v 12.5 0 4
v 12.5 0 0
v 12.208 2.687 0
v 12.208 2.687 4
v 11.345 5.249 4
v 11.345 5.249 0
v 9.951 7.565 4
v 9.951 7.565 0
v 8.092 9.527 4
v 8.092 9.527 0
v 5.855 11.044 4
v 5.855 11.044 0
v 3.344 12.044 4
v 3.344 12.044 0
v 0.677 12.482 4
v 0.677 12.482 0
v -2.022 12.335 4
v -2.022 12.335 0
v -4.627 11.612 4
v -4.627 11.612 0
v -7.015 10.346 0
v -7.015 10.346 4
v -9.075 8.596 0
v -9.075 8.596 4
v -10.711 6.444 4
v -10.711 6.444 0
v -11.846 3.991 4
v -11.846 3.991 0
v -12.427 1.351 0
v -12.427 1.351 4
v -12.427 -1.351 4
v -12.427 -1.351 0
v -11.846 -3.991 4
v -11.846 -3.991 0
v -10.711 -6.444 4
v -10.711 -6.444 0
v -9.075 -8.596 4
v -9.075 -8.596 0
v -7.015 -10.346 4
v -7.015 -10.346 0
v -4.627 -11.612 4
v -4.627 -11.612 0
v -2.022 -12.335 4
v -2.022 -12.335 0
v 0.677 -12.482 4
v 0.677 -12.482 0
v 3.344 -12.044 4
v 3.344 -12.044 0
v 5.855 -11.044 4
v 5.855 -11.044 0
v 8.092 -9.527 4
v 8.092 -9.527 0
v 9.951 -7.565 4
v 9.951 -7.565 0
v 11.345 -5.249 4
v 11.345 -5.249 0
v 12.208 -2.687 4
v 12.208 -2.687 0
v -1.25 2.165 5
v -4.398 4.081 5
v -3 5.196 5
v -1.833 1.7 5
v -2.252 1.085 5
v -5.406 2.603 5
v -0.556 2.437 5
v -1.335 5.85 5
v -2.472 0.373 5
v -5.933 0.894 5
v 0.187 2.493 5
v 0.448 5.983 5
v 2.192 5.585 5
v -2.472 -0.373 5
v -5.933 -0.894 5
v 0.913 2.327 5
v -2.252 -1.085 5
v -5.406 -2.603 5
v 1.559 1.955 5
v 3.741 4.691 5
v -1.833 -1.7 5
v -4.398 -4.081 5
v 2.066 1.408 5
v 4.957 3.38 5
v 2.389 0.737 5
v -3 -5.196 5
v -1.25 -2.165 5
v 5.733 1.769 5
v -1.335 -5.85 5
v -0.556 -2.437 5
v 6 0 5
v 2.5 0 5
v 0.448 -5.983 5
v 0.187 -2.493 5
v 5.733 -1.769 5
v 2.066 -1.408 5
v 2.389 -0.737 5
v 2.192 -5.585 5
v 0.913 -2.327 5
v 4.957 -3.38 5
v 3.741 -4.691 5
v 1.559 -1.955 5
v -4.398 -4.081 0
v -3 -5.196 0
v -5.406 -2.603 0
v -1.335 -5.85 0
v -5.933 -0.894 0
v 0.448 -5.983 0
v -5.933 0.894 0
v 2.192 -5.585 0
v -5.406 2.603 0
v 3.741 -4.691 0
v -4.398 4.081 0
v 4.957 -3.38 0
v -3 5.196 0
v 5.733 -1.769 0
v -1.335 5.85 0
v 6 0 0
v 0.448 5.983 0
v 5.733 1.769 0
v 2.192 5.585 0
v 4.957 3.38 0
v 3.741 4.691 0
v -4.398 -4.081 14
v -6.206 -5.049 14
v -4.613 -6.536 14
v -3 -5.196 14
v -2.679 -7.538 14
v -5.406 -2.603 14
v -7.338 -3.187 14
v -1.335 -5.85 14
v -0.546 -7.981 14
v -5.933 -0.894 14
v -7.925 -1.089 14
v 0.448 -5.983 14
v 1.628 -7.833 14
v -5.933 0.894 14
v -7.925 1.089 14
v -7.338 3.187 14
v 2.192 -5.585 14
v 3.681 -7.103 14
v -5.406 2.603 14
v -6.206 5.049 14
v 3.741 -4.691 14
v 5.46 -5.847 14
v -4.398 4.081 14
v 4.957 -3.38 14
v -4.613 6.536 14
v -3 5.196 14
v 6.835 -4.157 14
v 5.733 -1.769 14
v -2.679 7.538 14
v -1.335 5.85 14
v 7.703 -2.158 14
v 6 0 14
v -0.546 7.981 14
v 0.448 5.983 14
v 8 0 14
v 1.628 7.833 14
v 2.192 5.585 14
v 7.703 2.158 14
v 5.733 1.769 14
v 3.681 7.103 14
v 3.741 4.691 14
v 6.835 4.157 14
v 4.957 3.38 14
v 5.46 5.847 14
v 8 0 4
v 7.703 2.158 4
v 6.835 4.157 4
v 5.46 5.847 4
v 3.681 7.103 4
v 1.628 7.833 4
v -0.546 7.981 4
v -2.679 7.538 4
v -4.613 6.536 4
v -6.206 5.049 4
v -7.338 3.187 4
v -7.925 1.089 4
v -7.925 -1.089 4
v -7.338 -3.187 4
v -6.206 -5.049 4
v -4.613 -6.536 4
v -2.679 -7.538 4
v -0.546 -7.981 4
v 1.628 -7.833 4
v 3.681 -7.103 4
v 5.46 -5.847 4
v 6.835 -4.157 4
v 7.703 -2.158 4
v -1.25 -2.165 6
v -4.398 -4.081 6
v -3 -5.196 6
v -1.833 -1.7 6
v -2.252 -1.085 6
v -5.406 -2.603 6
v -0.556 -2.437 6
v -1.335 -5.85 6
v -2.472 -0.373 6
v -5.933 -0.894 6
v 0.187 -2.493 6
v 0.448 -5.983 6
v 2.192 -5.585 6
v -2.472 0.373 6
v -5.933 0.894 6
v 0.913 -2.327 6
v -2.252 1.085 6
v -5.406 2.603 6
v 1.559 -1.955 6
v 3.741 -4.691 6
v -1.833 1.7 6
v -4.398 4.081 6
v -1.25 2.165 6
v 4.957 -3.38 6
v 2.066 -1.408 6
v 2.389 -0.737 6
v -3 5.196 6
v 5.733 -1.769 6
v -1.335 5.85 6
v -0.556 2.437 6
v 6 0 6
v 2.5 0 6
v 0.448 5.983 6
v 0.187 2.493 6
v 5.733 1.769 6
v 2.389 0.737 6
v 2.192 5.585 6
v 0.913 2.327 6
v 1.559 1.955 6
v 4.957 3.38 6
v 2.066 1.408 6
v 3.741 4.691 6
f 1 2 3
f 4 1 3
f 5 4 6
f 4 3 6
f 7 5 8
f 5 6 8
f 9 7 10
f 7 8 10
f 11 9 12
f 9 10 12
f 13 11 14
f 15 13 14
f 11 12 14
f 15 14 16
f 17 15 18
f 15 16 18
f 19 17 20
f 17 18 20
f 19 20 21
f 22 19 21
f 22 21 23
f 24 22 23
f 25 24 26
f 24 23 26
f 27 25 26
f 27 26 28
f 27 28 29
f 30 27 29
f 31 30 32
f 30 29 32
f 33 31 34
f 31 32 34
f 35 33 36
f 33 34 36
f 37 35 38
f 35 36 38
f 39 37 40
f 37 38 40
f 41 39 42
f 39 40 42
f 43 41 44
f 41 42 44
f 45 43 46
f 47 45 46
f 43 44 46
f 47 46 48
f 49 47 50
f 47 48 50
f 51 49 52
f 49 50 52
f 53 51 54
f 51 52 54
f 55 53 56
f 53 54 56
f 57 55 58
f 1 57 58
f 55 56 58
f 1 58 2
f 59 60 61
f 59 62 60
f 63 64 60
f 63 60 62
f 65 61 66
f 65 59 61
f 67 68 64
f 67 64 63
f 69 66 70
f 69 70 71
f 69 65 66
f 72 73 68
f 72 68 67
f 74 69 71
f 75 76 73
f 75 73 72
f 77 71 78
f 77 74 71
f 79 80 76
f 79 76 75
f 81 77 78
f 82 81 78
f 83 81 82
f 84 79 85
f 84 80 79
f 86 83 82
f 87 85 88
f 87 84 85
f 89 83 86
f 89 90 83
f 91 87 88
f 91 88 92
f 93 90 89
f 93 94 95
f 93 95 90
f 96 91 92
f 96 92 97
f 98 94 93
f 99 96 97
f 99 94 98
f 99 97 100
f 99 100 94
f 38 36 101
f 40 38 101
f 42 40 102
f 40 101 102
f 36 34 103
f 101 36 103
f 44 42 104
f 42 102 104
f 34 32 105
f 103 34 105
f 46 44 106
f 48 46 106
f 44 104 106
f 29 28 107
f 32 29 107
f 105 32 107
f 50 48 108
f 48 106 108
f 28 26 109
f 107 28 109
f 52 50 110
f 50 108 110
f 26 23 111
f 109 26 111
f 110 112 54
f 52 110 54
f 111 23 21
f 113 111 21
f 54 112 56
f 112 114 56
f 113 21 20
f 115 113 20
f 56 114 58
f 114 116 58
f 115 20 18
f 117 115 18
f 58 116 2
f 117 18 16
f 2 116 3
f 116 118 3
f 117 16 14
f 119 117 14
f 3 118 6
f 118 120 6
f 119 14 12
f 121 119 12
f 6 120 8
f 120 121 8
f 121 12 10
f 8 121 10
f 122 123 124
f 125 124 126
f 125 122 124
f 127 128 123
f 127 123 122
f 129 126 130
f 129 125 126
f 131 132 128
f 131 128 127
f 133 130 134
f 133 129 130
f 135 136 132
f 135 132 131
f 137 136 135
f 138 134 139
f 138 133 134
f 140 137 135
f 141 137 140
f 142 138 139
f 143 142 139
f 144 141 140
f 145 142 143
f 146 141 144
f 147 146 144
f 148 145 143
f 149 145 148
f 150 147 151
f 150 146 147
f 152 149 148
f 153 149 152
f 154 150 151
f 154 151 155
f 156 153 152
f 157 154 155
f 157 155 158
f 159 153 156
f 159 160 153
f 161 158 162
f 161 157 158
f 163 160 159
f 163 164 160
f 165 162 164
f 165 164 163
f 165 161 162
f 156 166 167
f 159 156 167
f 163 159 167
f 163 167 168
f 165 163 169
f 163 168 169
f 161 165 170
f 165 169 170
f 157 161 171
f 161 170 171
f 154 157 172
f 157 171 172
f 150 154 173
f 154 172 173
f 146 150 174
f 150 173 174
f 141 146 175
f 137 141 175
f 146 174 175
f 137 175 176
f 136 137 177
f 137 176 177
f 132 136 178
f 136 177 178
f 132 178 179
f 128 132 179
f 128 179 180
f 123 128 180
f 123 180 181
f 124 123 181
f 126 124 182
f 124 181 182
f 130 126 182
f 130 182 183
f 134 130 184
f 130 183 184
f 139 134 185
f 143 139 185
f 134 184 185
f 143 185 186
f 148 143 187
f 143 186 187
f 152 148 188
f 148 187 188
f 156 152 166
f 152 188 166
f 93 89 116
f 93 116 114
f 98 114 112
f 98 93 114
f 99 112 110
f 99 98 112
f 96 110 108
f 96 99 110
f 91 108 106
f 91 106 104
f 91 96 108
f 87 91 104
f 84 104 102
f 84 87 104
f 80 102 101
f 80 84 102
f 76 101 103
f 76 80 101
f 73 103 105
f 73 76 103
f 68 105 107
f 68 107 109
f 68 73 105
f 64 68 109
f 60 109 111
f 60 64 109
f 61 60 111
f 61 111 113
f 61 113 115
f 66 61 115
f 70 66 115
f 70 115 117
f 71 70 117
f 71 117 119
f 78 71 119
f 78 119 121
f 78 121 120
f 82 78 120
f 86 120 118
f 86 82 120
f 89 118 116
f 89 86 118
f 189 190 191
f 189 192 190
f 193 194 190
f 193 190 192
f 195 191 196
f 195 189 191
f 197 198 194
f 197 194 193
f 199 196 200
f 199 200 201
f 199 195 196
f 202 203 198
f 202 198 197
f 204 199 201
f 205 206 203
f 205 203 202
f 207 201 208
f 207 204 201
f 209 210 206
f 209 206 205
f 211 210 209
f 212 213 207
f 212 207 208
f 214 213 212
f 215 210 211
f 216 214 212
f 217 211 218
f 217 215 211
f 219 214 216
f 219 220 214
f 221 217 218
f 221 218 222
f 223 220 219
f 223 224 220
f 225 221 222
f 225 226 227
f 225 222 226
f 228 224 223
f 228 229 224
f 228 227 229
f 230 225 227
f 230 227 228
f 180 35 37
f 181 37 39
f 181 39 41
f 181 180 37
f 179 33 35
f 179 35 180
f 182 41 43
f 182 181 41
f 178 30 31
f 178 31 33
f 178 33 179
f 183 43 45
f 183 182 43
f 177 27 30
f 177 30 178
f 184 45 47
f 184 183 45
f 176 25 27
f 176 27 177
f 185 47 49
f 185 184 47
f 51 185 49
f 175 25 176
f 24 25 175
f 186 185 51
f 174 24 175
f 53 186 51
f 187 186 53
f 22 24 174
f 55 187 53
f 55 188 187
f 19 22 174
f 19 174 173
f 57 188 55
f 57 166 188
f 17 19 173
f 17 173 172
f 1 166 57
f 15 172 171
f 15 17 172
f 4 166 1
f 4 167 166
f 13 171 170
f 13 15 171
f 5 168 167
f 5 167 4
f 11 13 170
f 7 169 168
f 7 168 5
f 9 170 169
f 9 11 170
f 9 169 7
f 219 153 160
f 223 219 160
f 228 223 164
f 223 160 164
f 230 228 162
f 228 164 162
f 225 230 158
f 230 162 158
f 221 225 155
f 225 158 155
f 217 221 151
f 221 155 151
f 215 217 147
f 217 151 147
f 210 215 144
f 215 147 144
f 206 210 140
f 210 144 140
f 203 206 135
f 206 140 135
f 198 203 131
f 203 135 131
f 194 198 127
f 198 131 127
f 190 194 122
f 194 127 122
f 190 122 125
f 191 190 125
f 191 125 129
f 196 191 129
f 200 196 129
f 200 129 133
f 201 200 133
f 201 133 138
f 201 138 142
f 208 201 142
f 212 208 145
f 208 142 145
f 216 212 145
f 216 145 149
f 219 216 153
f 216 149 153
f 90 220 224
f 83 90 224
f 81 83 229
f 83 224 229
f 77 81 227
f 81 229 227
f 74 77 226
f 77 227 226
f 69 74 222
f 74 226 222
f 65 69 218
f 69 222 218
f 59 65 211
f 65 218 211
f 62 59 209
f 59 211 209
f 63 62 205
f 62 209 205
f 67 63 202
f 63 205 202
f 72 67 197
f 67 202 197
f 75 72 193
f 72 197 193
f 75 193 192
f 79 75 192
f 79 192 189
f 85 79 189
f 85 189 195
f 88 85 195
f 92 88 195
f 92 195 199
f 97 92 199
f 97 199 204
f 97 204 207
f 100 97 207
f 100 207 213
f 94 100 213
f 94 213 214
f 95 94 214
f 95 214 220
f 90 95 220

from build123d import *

# Parameters (mm, degrees)
SKETCH_1_R          = 12.5
EXTRUDE_1_DEPTH     = 4
SKETCH_2_R          = 8
EXTRUDE_2_DEPTH     = 10
SKETCH_3_R          = 2.5
CUT_EXTRUDE_1_DEPTH = 23.549944568
SKETCH_4_R          = 6
CUT_EXTRUDE_2_DEPTH = 8
CUT_EXTRUDE_START   = -5
SKETCH_5_R          = 6
CUT_EXTRUDE_3_DEPTH = 5


with BuildPart() as part:
    # 草图1 → 凸台-拉伸1 (new body)
    with BuildSketch(Plane.XY):
        Circle(SKETCH_1_R)
    extrude(amount=EXTRUDE_1_DEPTH)

    # 草图2 → 凸台-拉伸2 (add)
    with BuildSketch(Plane.XY.offset(4)):
        Circle(SKETCH_2_R)
    extrude(amount=EXTRUDE_2_DEPTH)

    # 草图3 → 切除-拉伸1 (cut, through all)
    with BuildSketch(Plane.XY.offset(14)):
        Circle(SKETCH_3_R)
    extrude(amount=-CUT_EXTRUDE_1_DEPTH, mode=Mode.SUBTRACT)

    # 草图4 → 切除-拉伸2 (cut)
    with BuildSketch(Plane.XY.offset(14)):
        Circle(SKETCH_4_R)
    extrude(amount=-CUT_EXTRUDE_2_DEPTH, mode=Mode.SUBTRACT)

    # 草图5 → 切除-拉伸3 (cut)
    with BuildSketch(Plane(origin=(0, 0, 0), x_dir=(-1, 0, 0), z_dir=(0, 0, -1)).offset(CUT_EXTRUDE_START)):
        with Locations(Location((0, 0, 0), (0, 0, 180))):
            Circle(SKETCH_5_R)
    extrude(amount=CUT_EXTRUDE_3_DEPTH, mode=Mode.SUBTRACT)


solid = part.part
